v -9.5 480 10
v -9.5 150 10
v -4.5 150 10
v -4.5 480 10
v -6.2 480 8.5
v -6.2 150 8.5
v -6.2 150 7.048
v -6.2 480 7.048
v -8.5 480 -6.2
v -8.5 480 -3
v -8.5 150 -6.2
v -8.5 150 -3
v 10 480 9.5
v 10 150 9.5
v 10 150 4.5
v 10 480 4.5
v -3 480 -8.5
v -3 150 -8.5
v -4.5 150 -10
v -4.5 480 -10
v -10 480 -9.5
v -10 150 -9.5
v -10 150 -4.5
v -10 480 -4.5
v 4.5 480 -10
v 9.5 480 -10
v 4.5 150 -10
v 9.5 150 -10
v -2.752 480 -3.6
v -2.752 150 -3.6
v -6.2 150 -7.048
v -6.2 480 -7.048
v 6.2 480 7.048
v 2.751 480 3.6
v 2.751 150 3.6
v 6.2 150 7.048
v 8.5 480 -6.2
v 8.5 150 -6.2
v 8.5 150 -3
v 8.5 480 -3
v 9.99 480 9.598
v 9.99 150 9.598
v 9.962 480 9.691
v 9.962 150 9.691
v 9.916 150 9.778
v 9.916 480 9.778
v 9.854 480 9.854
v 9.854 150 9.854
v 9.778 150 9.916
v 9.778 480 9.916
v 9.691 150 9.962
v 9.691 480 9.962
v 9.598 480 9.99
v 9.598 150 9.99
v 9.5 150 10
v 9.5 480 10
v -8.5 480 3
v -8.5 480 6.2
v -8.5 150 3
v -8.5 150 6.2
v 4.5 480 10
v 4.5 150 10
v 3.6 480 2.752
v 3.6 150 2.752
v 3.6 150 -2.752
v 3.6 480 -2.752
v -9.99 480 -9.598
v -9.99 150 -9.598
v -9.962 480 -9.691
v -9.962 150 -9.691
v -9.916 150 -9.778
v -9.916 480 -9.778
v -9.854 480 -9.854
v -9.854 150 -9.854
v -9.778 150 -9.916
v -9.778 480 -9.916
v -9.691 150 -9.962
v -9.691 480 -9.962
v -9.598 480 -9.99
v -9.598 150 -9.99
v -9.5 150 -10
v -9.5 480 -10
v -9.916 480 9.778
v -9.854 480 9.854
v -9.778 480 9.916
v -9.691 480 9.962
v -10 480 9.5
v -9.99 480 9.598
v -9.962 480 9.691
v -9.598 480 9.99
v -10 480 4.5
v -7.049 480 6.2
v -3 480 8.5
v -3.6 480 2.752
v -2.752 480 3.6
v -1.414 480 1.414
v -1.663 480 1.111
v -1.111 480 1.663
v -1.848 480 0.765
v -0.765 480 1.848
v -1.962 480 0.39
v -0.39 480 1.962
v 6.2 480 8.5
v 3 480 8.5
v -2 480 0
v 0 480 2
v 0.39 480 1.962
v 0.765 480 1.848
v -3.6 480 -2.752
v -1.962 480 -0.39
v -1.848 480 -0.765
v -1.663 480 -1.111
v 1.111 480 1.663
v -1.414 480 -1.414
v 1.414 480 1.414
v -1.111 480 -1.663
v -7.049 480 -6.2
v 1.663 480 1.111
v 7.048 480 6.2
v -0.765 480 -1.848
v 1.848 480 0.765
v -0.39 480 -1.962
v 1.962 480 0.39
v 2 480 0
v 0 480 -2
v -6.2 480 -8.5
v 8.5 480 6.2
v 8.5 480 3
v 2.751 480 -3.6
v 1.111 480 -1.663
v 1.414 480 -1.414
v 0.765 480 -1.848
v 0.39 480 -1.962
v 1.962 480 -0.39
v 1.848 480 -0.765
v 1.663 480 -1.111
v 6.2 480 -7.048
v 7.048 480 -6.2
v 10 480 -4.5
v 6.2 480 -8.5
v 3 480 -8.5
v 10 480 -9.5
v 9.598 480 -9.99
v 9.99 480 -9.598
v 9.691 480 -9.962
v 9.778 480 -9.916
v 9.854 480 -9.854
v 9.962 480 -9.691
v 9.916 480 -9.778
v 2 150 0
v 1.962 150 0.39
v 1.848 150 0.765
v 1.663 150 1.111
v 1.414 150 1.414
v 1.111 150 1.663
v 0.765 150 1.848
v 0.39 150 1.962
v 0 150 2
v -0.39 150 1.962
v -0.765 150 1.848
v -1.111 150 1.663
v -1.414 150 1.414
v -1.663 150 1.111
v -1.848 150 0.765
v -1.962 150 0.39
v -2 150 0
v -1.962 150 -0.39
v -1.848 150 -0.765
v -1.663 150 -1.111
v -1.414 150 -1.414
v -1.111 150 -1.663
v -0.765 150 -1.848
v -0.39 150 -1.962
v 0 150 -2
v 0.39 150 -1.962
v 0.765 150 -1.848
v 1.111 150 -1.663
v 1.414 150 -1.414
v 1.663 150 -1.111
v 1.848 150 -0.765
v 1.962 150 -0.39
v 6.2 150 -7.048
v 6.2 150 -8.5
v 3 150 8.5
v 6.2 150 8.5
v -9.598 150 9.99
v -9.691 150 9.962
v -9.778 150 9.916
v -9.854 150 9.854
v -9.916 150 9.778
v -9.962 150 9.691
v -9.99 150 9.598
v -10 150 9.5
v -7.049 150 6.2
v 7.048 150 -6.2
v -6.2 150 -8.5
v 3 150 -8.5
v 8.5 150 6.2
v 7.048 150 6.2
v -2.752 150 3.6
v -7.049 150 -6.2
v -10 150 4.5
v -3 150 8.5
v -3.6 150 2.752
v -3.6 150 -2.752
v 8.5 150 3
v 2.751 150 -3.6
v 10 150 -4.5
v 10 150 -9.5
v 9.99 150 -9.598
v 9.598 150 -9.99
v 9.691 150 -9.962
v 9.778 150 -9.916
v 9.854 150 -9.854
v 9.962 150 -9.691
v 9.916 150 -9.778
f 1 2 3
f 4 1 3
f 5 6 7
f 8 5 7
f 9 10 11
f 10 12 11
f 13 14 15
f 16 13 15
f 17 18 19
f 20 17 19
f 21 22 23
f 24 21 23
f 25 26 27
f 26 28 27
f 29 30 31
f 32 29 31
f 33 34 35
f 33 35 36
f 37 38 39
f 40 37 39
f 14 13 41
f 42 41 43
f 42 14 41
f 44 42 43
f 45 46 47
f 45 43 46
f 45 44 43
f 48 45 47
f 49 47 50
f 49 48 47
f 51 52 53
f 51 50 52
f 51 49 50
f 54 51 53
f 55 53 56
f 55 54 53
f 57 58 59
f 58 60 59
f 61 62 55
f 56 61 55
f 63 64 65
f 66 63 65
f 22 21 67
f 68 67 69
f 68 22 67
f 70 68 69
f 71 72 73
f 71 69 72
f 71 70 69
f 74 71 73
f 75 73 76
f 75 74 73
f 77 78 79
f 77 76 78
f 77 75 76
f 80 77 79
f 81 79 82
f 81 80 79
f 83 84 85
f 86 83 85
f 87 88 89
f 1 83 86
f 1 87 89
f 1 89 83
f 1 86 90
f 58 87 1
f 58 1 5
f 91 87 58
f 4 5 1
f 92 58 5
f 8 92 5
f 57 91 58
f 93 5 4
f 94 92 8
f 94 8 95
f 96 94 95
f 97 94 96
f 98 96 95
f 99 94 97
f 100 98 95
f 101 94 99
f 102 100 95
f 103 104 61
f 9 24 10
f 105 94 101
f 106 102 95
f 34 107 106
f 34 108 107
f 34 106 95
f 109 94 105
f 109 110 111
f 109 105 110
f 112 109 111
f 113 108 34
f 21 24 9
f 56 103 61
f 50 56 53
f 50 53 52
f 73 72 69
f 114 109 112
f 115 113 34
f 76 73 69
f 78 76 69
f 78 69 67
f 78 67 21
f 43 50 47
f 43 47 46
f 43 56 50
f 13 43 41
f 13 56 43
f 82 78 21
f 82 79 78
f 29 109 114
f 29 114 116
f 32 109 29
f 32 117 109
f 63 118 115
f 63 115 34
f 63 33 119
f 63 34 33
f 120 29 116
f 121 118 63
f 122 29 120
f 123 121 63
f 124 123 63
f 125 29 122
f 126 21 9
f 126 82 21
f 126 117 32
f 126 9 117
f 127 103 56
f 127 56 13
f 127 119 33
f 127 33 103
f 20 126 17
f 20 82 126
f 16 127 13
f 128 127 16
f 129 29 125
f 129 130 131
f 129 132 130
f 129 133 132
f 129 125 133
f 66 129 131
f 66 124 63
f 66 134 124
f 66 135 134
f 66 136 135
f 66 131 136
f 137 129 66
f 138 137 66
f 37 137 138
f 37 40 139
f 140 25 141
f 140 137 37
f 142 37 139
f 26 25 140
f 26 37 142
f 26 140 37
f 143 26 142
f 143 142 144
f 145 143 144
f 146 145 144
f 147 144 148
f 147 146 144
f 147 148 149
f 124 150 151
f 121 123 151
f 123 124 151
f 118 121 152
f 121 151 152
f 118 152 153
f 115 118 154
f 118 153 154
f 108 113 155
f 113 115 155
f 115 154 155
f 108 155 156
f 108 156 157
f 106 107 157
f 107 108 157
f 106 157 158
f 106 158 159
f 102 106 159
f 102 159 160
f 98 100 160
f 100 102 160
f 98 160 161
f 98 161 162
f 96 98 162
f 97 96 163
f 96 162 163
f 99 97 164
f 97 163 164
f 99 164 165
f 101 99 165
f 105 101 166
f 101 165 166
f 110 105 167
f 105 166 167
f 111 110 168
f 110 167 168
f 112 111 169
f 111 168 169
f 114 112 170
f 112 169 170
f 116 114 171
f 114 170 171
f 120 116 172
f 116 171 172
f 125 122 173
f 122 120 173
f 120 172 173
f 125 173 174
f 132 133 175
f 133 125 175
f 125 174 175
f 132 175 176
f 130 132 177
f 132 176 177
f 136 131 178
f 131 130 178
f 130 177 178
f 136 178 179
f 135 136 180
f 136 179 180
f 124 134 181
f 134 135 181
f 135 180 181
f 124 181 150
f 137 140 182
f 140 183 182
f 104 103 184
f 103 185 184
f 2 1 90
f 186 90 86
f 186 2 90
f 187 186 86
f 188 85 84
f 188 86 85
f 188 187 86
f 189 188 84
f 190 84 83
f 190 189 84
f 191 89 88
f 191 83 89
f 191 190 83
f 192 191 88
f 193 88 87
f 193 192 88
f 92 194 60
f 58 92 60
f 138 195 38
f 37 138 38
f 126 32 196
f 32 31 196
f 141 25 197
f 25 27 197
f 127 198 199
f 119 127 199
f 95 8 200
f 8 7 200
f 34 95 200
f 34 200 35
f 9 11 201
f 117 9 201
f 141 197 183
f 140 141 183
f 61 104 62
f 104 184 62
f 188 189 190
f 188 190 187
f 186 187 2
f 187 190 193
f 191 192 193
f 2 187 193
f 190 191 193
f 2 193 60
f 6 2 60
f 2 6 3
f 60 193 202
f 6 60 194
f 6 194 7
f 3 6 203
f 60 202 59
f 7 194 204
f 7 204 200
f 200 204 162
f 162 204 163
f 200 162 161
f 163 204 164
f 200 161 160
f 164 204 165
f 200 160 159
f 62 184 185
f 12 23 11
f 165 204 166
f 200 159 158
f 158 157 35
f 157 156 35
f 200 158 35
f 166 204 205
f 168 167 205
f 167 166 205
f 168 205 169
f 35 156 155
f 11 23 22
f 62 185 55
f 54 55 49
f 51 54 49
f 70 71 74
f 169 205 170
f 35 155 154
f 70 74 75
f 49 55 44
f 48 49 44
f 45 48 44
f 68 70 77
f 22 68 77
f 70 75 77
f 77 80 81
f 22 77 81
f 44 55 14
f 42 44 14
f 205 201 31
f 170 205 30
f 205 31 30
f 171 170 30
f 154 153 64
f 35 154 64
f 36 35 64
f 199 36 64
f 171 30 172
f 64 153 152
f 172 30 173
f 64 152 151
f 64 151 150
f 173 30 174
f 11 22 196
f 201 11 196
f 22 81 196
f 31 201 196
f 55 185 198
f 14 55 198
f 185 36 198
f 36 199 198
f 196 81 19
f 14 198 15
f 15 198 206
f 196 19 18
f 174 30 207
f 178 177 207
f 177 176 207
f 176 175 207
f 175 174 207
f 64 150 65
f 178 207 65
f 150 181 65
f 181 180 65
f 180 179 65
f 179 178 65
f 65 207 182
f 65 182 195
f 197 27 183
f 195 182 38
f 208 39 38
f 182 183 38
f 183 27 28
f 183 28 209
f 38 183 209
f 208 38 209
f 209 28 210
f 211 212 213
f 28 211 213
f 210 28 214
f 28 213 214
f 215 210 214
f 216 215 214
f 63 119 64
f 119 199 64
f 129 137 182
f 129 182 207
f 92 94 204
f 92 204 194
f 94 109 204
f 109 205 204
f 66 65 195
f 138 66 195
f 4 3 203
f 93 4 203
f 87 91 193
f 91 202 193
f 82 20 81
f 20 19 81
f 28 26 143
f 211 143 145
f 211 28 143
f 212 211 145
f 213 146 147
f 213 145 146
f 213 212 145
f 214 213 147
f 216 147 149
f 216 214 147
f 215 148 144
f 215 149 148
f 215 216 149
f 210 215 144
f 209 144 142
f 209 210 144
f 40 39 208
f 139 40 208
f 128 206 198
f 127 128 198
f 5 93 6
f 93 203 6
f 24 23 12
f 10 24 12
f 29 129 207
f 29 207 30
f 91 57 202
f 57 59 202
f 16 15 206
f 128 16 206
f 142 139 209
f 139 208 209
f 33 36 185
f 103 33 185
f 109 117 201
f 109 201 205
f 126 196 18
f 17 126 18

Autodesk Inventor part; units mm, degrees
ref_plane "YZ Plane" through (0, 0, 0) normal (1, 0, 0) x (0, 1, 0)
ref_plane "XZ Plane" through (0, 0, 0) normal (0, 1, 0) x (-1, 0, 0)
ref_plane "Work Plane1" through (-2.7515, 150, 3.6) normal (0, 1, 0) x (1, 0, 0)
sketch "Sketch1" plane through (-2.7515, 150, 3.6) normal (0, 1, 0) x (1, 0, 0)
  arc A0 (-6.7485, 13.6) -> (-7.2485, 13.1) centre (-6.7485, 13.1) ccw projected
  line L0 (-7.2485, 13.1) -> (-7.2485, 8.1) projected
  line L1 (-7.2485, 8.1) -> (-5.7485, 6.6) projected
  line L2 (-5.7485, 6.6) -> (-5.7485, 9.8) projected
  line L3 (-5.7485, 9.8) -> (-4.2971, 9.8) projected
  line L4 (-4.2971, 9.8) -> (-0.8485, 6.3515) projected
  line L5 (-0.8485, 6.3515) -> (-0.8485, 0.8485) projected
  line L6 (-0.8485, 0.8485) -> (-4.2971, -2.6) projected
  line L7 (-4.2971, -2.6) -> (-5.7485, -2.6) projected
  line L8 (-5.7485, -2.6) -> (-5.7485, 0.6) projected
  line L9 (-5.7485, 0.6) -> (-7.2485, -0.9) projected
  line L10 (-7.2485, -0.9) -> (-7.2485, -5.9) projected
  arc A1 (-7.2485, -5.9) -> (-6.7485, -6.4) centre (-6.7485, -5.9) ccw projected
  line L11 (-6.7485, -6.4) -> (-1.7485, -6.4) projected
  line L12 (-1.7485, -6.4) -> (-0.2485, -4.9) projected
  line L13 (-0.2485, -4.9) -> (-3.4485, -4.9) projected
  line L14 (-3.4485, -4.9) -> (-3.4485, -3.4485) projected
  line L15 (-3.4485, -3.4485) -> (0, 0) projected
  line L16 (0, 0) -> (5.5029, 0) projected
  line L17 (5.5029, 0) -> (8.9515, -3.4485) projected
  line L18 (8.9515, -3.4485) -> (8.9515, -4.9) projected
  line L19 (8.9515, -4.9) -> (5.7515, -4.9) projected
  line L20 (5.7515, -4.9) -> (7.2515, -6.4) projected
  line L21 (7.2515, -6.4) -> (12.2515, -6.4) projected
  arc A2 (12.2515, -6.4) -> (12.7515, -5.9) centre (12.2515, -5.9) ccw projected
  line L22 (12.7515, -5.9) -> (12.7515, -0.9) projected
  line L23 (12.7515, -0.9) -> (11.2515, 0.6) projected
  line L24 (11.2515, 0.6) -> (11.2515, -2.6) projected
  line L25 (11.2515, -2.6) -> (9.8, -2.6) projected
  line L26 (9.8, -2.6) -> (6.3515, 0.8485) projected
  line L27 (6.3515, 0.8485) -> (6.3515, 6.3515) projected
  line L28 (6.3515, 6.3515) -> (9.8, 9.8) projected
  line L29 (9.8, 9.8) -> (11.2515, 9.8) projected
  line L30 (11.2515, 9.8) -> (11.2515, 6.6) projected
  line L31 (11.2515, 6.6) -> (12.7515, 8.1) projected
  line L32 (12.7515, 8.1) -> (12.7515, 13.1) projected
  arc A3 (12.7515, 13.1) -> (12.2515, 13.6) centre (12.2515, 13.1) ccw projected
  line L33 (12.2515, 13.6) -> (7.2515, 13.6) projected
  line L34 (7.2515, 13.6) -> (5.7515, 12.1) projected
  line L35 (5.7515, 12.1) -> (8.9515, 12.1) projected
  line L36 (8.9515, 12.1) -> (8.9515, 10.6485) projected
  line L37 (8.9515, 10.6485) -> (5.5029, 7.2) projected
  line L38 (5.5029, 7.2) -> (0, 7.2) projected
  line L39 (0, 7.2) -> (-3.4485, 10.6485) projected
  line L40 (-3.4485, 10.6485) -> (-3.4485, 12.1) projected
  line L41 (-3.4485, 12.1) -> (-0.2485, 12.1) projected
  line L42 (-0.2485, 12.1) -> (-1.7485, 13.6) projected
  line L43 (-1.7485, 13.6) -> (-6.7485, 13.6) projected
  circle A4 centre (2.7515, 3.6) radius 2 projected
extrude "Extrusion1" add sketch "Sketch1" along normal blind 330
ref_plane "Work Plane2" through (0, 150, -9.5) normal (1, 0, 0) x (0, 0, -1)
ref_plane "Work Plane3" through (-4.5, 150, 0) normal (0, 0, 1) x (1, 0, 0)
properties part number "20x20mmx150mm alminum profile" material "Aluminum 6061"
